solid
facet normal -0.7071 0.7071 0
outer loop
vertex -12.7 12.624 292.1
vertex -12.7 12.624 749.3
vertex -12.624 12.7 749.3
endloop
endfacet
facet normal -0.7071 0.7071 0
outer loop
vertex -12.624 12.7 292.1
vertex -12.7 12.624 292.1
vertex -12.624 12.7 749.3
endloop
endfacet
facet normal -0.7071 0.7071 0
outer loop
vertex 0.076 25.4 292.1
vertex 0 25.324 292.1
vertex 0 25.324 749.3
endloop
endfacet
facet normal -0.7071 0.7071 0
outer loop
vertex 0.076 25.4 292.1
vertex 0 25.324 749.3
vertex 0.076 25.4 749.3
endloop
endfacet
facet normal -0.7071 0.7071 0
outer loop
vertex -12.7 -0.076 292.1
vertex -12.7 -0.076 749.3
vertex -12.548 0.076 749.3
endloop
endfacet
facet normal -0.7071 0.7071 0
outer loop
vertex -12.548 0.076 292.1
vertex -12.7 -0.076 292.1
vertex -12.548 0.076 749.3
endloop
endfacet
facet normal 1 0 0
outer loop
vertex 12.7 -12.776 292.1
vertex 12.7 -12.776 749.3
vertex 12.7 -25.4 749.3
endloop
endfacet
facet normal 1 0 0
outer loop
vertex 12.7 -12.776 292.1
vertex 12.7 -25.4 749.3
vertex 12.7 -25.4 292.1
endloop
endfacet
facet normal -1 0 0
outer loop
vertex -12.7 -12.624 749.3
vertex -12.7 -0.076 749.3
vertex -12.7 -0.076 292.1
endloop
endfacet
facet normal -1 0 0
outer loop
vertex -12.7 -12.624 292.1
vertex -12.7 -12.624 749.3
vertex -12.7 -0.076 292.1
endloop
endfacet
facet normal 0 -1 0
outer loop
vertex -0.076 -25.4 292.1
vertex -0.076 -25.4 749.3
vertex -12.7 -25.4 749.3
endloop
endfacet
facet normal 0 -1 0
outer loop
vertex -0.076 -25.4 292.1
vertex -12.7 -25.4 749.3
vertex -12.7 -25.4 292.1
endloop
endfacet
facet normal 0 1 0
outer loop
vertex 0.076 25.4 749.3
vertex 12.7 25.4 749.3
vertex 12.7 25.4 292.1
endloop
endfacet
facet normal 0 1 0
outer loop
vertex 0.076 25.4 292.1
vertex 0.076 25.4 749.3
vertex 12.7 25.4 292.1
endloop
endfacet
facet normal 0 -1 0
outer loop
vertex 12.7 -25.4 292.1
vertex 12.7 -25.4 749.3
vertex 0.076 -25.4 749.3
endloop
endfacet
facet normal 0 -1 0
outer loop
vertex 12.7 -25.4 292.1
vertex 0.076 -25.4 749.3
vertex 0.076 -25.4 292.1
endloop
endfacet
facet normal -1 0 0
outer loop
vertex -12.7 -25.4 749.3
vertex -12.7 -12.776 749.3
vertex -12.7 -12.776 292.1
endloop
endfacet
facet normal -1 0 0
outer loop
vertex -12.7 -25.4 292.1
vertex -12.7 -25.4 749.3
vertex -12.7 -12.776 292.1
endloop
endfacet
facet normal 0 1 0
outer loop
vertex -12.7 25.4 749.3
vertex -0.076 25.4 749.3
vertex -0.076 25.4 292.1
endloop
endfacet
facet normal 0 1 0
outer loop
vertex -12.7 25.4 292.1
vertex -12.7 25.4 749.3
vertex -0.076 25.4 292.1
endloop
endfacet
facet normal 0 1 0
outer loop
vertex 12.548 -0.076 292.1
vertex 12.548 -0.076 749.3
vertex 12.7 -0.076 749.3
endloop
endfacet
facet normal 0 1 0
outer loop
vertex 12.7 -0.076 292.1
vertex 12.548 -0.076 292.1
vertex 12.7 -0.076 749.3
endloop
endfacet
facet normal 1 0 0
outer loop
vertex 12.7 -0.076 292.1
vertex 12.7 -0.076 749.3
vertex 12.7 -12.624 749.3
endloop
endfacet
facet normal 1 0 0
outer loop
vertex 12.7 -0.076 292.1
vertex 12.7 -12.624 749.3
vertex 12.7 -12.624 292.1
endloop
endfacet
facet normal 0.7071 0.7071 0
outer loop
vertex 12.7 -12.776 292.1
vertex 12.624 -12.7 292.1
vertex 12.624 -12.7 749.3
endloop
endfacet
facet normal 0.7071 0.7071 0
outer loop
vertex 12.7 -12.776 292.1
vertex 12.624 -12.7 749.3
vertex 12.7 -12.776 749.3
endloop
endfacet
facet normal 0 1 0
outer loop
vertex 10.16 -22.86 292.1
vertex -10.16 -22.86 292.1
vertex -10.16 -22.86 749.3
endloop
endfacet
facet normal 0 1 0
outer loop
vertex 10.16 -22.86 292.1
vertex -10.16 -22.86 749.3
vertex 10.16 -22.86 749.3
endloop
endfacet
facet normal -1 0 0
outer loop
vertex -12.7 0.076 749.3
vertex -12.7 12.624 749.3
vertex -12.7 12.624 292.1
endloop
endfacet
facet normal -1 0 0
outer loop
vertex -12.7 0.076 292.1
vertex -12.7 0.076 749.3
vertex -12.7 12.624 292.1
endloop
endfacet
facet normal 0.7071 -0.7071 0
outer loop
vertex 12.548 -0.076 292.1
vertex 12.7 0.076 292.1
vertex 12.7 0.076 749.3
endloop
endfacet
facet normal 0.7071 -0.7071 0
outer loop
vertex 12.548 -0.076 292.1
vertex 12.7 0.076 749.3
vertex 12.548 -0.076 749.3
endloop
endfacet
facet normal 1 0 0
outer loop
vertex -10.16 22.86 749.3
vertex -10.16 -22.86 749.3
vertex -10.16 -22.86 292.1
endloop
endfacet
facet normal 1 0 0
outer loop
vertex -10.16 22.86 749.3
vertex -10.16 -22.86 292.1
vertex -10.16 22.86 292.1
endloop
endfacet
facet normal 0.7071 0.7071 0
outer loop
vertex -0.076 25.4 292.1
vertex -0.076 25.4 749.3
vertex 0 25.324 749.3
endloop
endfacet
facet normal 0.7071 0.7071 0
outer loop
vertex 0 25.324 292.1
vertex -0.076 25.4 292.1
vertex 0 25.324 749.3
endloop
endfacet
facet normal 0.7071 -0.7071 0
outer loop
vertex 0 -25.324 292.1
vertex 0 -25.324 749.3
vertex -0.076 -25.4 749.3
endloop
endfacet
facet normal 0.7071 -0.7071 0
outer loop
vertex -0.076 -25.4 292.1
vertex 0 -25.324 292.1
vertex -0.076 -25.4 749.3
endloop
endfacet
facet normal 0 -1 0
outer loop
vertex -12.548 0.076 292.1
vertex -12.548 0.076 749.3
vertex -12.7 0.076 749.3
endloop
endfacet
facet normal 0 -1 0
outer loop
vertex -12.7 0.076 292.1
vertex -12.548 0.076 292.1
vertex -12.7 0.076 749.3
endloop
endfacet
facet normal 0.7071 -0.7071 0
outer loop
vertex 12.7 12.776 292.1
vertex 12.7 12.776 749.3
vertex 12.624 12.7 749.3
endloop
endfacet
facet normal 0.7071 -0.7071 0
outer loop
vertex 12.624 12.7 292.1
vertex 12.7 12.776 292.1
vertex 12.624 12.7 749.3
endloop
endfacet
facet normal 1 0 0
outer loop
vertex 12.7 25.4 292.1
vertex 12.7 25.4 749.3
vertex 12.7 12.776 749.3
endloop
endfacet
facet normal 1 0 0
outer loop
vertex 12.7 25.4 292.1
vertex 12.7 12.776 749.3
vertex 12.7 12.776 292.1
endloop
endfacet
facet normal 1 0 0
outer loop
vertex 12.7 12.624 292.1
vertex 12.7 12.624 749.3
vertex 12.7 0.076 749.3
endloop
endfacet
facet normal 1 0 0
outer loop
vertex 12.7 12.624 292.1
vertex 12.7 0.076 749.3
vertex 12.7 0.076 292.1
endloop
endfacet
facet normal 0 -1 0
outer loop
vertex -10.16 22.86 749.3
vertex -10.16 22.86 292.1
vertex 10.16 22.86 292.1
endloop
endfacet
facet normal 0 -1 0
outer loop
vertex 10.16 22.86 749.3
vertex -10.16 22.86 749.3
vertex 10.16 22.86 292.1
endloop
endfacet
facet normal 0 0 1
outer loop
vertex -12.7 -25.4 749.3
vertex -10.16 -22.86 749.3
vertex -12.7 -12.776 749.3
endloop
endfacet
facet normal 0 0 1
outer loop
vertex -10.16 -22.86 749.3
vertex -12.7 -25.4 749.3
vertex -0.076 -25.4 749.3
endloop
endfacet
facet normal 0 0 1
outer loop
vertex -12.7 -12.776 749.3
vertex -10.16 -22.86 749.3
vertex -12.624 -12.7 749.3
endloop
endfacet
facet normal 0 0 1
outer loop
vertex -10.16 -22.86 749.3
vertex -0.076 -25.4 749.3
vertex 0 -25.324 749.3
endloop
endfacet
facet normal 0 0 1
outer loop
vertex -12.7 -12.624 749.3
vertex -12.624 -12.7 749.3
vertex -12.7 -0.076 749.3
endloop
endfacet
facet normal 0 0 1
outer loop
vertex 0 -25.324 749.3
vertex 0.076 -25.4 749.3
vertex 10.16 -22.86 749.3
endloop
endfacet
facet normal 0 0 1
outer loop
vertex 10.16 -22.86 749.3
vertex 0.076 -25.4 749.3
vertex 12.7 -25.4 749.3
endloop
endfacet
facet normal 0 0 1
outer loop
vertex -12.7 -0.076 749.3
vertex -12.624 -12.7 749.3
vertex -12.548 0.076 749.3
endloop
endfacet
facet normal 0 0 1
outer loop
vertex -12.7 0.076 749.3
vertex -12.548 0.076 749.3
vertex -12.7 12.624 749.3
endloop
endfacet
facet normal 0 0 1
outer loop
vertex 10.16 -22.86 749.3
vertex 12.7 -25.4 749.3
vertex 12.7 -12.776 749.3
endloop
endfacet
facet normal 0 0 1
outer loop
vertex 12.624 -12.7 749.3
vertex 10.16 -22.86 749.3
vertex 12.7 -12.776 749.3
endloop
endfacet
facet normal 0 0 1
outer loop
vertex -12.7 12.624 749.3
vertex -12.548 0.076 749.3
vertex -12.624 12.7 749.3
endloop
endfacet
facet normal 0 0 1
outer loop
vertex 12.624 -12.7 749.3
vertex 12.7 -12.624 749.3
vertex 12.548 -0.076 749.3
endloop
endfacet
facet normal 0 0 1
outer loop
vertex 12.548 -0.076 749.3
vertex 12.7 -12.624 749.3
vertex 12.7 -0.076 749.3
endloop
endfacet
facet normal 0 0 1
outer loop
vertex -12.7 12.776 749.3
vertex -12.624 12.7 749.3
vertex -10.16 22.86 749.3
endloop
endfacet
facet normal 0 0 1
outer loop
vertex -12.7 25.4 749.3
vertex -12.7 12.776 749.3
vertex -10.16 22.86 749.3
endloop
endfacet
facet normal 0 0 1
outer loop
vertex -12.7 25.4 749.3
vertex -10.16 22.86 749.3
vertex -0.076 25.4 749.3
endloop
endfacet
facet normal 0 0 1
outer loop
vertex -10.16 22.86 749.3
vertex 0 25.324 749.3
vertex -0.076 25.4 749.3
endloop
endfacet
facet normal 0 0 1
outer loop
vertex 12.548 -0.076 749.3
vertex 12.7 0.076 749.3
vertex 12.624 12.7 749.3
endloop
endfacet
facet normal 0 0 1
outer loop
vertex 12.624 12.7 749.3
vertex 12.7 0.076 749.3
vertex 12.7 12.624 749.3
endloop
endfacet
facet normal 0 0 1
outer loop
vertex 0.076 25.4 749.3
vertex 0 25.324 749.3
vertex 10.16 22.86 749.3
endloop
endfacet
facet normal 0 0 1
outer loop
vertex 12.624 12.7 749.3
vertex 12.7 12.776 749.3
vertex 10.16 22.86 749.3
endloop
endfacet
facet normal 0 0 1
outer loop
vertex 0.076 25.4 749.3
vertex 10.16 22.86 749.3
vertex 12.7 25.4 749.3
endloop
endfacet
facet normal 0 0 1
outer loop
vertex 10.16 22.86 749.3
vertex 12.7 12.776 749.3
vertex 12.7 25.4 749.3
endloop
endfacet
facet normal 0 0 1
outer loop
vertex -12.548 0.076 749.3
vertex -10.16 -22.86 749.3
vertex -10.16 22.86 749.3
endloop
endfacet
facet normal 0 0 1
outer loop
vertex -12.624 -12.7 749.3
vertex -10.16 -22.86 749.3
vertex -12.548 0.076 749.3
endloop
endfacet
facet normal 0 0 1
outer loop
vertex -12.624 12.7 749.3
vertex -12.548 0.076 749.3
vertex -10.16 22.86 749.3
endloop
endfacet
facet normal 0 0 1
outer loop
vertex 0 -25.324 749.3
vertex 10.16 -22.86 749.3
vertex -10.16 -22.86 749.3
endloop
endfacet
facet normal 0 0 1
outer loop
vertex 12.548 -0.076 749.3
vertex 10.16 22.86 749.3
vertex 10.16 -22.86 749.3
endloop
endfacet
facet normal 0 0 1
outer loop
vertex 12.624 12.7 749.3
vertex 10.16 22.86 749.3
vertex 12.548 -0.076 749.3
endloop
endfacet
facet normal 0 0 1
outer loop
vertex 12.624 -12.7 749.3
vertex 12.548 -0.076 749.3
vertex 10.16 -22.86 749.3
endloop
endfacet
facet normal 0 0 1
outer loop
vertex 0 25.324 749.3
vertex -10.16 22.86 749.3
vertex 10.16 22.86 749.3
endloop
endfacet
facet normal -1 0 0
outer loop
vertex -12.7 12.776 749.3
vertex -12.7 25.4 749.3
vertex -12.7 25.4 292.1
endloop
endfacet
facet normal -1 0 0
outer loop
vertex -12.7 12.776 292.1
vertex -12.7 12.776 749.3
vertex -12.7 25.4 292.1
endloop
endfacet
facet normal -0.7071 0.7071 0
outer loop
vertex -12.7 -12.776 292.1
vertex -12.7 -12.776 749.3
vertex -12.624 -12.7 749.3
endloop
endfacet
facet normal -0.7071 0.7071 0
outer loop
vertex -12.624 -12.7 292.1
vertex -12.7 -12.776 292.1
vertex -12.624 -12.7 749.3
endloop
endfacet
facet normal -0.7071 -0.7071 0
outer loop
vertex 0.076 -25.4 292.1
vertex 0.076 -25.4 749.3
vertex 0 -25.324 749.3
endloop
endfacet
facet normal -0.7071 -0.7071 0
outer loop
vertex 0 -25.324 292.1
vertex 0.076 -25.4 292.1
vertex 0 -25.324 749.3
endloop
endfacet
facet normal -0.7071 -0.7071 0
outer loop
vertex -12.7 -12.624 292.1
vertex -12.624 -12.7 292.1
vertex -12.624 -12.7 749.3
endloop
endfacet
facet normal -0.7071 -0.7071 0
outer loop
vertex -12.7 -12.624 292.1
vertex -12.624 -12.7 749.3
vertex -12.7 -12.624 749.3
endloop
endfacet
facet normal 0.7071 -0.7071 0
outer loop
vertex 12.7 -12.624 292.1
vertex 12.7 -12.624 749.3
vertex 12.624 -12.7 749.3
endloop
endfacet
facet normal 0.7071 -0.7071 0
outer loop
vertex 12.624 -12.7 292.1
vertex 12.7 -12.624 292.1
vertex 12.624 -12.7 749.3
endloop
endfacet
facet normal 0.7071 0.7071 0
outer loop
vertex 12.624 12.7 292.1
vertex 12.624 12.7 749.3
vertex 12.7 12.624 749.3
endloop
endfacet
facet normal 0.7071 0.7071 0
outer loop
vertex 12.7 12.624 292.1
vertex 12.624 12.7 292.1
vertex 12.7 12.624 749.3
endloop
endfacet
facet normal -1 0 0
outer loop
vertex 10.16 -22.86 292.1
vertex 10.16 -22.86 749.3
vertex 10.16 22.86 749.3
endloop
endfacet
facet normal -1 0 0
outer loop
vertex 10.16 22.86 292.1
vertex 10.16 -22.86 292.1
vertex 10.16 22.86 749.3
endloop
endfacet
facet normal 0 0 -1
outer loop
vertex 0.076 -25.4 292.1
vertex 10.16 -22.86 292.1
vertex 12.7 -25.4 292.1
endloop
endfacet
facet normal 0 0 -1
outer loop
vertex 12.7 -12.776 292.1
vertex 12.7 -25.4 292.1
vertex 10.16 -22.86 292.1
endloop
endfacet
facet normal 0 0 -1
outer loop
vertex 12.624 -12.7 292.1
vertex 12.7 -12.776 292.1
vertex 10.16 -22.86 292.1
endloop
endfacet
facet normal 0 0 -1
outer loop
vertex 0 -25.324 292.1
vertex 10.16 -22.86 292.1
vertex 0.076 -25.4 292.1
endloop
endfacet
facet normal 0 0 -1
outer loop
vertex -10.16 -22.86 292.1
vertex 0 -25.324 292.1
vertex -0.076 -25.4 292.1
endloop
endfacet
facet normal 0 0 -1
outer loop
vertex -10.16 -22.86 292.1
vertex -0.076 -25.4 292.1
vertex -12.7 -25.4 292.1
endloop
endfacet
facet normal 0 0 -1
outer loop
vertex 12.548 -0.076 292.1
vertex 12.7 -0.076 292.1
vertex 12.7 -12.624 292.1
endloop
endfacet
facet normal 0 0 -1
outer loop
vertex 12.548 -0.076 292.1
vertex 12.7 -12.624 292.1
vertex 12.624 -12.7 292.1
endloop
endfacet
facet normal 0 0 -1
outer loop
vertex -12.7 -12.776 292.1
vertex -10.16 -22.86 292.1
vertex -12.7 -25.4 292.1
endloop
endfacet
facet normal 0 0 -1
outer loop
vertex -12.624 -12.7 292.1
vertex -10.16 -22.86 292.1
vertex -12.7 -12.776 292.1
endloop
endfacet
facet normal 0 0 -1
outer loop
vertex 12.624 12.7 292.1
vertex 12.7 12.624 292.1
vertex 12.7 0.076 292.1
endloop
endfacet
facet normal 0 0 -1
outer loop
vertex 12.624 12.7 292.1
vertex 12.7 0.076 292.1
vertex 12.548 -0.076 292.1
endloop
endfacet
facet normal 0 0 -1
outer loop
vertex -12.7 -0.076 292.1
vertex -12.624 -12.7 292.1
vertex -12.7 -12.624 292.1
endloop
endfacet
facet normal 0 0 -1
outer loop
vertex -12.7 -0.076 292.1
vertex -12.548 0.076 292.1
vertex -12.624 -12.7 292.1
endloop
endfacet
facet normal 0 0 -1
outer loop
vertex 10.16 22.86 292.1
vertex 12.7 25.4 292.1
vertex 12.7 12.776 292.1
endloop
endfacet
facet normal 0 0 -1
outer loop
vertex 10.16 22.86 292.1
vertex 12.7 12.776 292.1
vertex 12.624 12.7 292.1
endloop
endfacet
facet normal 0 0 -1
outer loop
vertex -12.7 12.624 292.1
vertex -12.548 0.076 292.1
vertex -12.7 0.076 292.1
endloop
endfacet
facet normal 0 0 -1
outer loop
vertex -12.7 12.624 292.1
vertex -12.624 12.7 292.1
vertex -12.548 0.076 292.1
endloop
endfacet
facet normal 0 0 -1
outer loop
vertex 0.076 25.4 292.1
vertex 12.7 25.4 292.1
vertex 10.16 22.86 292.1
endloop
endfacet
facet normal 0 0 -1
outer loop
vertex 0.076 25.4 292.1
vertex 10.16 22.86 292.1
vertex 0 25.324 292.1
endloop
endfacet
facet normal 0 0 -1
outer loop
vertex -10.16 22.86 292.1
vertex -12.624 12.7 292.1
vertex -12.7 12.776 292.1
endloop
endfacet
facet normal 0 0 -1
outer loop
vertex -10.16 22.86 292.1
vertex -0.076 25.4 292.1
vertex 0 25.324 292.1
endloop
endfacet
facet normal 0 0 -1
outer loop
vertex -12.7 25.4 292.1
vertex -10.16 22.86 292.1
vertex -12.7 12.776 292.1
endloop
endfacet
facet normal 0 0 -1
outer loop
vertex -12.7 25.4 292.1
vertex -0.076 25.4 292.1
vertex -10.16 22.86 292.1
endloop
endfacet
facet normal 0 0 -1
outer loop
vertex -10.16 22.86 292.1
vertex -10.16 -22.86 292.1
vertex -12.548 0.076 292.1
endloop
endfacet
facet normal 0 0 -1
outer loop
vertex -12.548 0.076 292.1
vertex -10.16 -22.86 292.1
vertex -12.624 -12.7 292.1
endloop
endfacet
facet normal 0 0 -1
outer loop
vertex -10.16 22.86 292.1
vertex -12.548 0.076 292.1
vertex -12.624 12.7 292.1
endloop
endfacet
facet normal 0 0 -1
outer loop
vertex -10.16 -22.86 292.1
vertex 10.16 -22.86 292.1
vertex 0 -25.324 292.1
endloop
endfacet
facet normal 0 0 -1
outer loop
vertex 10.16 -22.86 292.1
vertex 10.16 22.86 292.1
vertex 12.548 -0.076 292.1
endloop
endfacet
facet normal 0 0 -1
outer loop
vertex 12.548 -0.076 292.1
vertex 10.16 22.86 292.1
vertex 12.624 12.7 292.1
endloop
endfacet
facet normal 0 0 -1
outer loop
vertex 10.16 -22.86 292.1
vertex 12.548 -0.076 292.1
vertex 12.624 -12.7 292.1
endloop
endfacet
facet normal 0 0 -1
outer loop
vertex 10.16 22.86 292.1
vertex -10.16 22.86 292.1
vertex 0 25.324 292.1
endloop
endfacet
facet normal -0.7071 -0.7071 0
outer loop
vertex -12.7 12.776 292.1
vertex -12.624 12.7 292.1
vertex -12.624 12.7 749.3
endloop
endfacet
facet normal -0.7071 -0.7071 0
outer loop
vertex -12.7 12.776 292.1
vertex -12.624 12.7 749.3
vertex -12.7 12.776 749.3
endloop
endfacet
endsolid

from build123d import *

# Parameters (mm, degrees)
SKETCH1_W           = 1498.6
SKETCH1_H           = 50.8
BOSS_EXTRUDE1_DEPTH = 25.4
CUT_EXTRUDE1_DEPTH  = 1498.6
CUT_EXTRUDE2_DEPTH  = 1499.869043646
CUT_EXTRUDE3_DEPTH  = 1498.6
CUT_EXTRUDE4_DEPTH  = 1498.6
CUT_EXTRUDE5_DEPTH  = 1499.869043646
CUT_EXTRUDE6_DEPTH  = 1499.869043646
CUT_EXTRUDE7_DEPTH  = 1498.6
CUT_EXTRUDE8_DEPTH  = 1498.6
SKETCH10_W          = 20.32
SKETCH10_H          = 45.72
CUT_EXTRUDE9_DEPTH  = 1499.869043646
DRAFT1_ANGLE        = 45
DRAFT2_ANGLE        = 45.000000005
DRAFT3_ANGLE        = 45
DRAFT4_ANGLE        = 45
DRAFT5_ANGLE        = 45
DRAFT6_ANGLE        = 44.999999995
SKETCH11_W          = 61.962293059
SKETCH11_H          = 88.678950317
CUT_EXTRUDE10_DEPTH = 1041.4


with BuildPart() as part:
    # Sketch1 → Boss-Extrude1 (new body)
    with BuildSketch(Plane(origin=(12.7, 0, 0), x_dir=(0, 0, -1), z_dir=(1, 0, 0))):
        Rectangle(SKETCH1_W, SKETCH1_H)
    extrude(amount=-BOSS_EXTRUDE1_DEPTH)

    # Sketch2 → Cut-Extrude1 (cut)
    with BuildSketch(Plane.XY.offset(749.3)):
        Polygon((0.0762, 25.4), (-0.0762, 25.4), (0.0762, 25.2476), align=None)
    extrude(amount=-CUT_EXTRUDE1_DEPTH, mode=Mode.SUBTRACT)

    # Sketch3 → Cut-Extrude2 (cut, through all)
    with BuildSketch(Plane.XY.offset(749.3)):
        Polygon((12.7, 12.6238), (12.7, 12.7762), (12.5476, 12.7762), align=None)
    extrude(amount=-CUT_EXTRUDE2_DEPTH, mode=Mode.SUBTRACT)

    # Sketch4 → Cut-Extrude3 (cut)
    with BuildSketch(Plane.XY.offset(749.3)):
        Polygon((12.7, -0.0762), (12.7, 0.0762), (12.5476, -0.0762), align=None)
    extrude(amount=-CUT_EXTRUDE3_DEPTH, mode=Mode.SUBTRACT)

    # Sketch5 → Cut-Extrude4 (cut)
    with BuildSketch(Plane.XY.offset(749.3)):
        Polygon((12.7, -12.7762), (12.7, -12.6238), (12.5476, -12.6238), align=None)
    extrude(amount=-CUT_EXTRUDE4_DEPTH, mode=Mode.SUBTRACT)

    # Sketch6 → Cut-Extrude5 (cut, through all)
    with BuildSketch(Plane.XY.offset(749.3)):
        Polygon((0.0762, -25.4), (-0.0762, -25.2476), (-0.0762, -25.4), align=None)
    extrude(amount=-CUT_EXTRUDE5_DEPTH, mode=Mode.SUBTRACT)

    # Sketch7 → Cut-Extrude6 (cut, through all)
    with BuildSketch(Plane.XY.offset(749.3)):
        Polygon((-12.7, -12.6238), (-12.7, -12.7762), (-12.5476, -12.7762), align=None)
    extrude(amount=-CUT_EXTRUDE6_DEPTH, mode=Mode.SUBTRACT)

    # Sketch8 → Cut-Extrude7 (cut)
    with BuildSketch(Plane.XY.offset(749.3)):
        Polygon((-12.7, 0.0762), (-12.7, -0.0762), (-12.5476, 0.0762), align=None)
    extrude(amount=-CUT_EXTRUDE7_DEPTH, mode=Mode.SUBTRACT)

    # Sketch9 → Cut-Extrude8 (cut)
    with BuildSketch(Plane.XY.offset(749.3)):
        Polygon((-12.7, 12.7762), (-12.7, 12.6238), (-12.5476, 12.6238), align=None)
    extrude(amount=-CUT_EXTRUDE8_DEPTH, mode=Mode.SUBTRACT)

    # Sketch10 → Cut-Extrude9 (cut, through all)
    with BuildSketch(Plane.XY.offset(749.3)):
        Rectangle(SKETCH10_W, SKETCH10_H)
    extrude(amount=-CUT_EXTRUDE9_DEPTH, mode=Mode.SUBTRACT)

    # Draft1
    draft1_faces = [part.faces().sort_by_distance(p)[0] for p in [
        (0.0762, 25.3238, 0),
    ]]
    draft(draft1_faces, Plane(origin=(-12.7, 25.4, -749.3), x_dir=(0, 0, 1), z_dir=(0, 1, 0)), DRAFT1_ANGLE)

    # Draft2
    draft2_faces = [part.faces().sort_by_distance(p)[0] for p in [
        (12.6238, 12.7762, 0),
    ]]
    draft(draft2_faces, Plane(origin=(12.7, 0, 0), x_dir=(0, 0, 1), z_dir=(1, 0, 0)), DRAFT2_ANGLE)

    # Draft3
    draft3_faces = [part.faces().sort_by_distance(p)[0] for p in [
        (-0.0762, -25.3238, 0),
    ]]
    draft(draft3_faces, Plane(origin=(-12.7, -25.4, 749.3), x_dir=(0, 0, -1), z_dir=(0, -1, 0)), DRAFT3_ANGLE)

    # Draft4
    draft4_faces = [part.faces().sort_by_distance(p)[0] for p in [
        (-12.6238, -12.7762, 0),
    ]]
    draft(draft4_faces, Plane(origin=(-12.7, 0, 0), x_dir=(0, 0, -1), z_dir=(-1, 0, 0)), DRAFT4_ANGLE)

    # Draft5
    draft5_faces = [part.faces().sort_by_distance(p)[0] for p in [
        (12.6238, -12.6238, 0),
        (12.6238, 0, 0),
    ]]
    draft(draft5_faces, Plane(origin=(12.7, 0, 0), x_dir=(0, 0, 1), z_dir=(1, 0, 0)), DRAFT5_ANGLE)

    # Draft6
    draft6_faces = [part.faces().sort_by_distance(p)[0] for p in [
        (-12.6238, 0, 0),
        (-12.6238, 12.6238, 0),
    ]]
    draft(draft6_faces, Plane(origin=(-12.7, 0, 0), x_dir=(0, 0, -1), z_dir=(-1, 0, 0)), DRAFT6_ANGLE)

    # Sketch11 → Cut-Extrude10 (cut)
    with BuildSketch(Plane(origin=(0, 0, -749.3), x_dir=(-1, 0, 0), z_dir=(0, 0, -1))):
        with Locations((-2.92473676, 0.325700182)):
            Rectangle(SKETCH11_W, SKETCH11_H)
    extrude(amount=-CUT_EXTRUDE10_DEPTH, mode=Mode.SUBTRACT)


solid = part.part
